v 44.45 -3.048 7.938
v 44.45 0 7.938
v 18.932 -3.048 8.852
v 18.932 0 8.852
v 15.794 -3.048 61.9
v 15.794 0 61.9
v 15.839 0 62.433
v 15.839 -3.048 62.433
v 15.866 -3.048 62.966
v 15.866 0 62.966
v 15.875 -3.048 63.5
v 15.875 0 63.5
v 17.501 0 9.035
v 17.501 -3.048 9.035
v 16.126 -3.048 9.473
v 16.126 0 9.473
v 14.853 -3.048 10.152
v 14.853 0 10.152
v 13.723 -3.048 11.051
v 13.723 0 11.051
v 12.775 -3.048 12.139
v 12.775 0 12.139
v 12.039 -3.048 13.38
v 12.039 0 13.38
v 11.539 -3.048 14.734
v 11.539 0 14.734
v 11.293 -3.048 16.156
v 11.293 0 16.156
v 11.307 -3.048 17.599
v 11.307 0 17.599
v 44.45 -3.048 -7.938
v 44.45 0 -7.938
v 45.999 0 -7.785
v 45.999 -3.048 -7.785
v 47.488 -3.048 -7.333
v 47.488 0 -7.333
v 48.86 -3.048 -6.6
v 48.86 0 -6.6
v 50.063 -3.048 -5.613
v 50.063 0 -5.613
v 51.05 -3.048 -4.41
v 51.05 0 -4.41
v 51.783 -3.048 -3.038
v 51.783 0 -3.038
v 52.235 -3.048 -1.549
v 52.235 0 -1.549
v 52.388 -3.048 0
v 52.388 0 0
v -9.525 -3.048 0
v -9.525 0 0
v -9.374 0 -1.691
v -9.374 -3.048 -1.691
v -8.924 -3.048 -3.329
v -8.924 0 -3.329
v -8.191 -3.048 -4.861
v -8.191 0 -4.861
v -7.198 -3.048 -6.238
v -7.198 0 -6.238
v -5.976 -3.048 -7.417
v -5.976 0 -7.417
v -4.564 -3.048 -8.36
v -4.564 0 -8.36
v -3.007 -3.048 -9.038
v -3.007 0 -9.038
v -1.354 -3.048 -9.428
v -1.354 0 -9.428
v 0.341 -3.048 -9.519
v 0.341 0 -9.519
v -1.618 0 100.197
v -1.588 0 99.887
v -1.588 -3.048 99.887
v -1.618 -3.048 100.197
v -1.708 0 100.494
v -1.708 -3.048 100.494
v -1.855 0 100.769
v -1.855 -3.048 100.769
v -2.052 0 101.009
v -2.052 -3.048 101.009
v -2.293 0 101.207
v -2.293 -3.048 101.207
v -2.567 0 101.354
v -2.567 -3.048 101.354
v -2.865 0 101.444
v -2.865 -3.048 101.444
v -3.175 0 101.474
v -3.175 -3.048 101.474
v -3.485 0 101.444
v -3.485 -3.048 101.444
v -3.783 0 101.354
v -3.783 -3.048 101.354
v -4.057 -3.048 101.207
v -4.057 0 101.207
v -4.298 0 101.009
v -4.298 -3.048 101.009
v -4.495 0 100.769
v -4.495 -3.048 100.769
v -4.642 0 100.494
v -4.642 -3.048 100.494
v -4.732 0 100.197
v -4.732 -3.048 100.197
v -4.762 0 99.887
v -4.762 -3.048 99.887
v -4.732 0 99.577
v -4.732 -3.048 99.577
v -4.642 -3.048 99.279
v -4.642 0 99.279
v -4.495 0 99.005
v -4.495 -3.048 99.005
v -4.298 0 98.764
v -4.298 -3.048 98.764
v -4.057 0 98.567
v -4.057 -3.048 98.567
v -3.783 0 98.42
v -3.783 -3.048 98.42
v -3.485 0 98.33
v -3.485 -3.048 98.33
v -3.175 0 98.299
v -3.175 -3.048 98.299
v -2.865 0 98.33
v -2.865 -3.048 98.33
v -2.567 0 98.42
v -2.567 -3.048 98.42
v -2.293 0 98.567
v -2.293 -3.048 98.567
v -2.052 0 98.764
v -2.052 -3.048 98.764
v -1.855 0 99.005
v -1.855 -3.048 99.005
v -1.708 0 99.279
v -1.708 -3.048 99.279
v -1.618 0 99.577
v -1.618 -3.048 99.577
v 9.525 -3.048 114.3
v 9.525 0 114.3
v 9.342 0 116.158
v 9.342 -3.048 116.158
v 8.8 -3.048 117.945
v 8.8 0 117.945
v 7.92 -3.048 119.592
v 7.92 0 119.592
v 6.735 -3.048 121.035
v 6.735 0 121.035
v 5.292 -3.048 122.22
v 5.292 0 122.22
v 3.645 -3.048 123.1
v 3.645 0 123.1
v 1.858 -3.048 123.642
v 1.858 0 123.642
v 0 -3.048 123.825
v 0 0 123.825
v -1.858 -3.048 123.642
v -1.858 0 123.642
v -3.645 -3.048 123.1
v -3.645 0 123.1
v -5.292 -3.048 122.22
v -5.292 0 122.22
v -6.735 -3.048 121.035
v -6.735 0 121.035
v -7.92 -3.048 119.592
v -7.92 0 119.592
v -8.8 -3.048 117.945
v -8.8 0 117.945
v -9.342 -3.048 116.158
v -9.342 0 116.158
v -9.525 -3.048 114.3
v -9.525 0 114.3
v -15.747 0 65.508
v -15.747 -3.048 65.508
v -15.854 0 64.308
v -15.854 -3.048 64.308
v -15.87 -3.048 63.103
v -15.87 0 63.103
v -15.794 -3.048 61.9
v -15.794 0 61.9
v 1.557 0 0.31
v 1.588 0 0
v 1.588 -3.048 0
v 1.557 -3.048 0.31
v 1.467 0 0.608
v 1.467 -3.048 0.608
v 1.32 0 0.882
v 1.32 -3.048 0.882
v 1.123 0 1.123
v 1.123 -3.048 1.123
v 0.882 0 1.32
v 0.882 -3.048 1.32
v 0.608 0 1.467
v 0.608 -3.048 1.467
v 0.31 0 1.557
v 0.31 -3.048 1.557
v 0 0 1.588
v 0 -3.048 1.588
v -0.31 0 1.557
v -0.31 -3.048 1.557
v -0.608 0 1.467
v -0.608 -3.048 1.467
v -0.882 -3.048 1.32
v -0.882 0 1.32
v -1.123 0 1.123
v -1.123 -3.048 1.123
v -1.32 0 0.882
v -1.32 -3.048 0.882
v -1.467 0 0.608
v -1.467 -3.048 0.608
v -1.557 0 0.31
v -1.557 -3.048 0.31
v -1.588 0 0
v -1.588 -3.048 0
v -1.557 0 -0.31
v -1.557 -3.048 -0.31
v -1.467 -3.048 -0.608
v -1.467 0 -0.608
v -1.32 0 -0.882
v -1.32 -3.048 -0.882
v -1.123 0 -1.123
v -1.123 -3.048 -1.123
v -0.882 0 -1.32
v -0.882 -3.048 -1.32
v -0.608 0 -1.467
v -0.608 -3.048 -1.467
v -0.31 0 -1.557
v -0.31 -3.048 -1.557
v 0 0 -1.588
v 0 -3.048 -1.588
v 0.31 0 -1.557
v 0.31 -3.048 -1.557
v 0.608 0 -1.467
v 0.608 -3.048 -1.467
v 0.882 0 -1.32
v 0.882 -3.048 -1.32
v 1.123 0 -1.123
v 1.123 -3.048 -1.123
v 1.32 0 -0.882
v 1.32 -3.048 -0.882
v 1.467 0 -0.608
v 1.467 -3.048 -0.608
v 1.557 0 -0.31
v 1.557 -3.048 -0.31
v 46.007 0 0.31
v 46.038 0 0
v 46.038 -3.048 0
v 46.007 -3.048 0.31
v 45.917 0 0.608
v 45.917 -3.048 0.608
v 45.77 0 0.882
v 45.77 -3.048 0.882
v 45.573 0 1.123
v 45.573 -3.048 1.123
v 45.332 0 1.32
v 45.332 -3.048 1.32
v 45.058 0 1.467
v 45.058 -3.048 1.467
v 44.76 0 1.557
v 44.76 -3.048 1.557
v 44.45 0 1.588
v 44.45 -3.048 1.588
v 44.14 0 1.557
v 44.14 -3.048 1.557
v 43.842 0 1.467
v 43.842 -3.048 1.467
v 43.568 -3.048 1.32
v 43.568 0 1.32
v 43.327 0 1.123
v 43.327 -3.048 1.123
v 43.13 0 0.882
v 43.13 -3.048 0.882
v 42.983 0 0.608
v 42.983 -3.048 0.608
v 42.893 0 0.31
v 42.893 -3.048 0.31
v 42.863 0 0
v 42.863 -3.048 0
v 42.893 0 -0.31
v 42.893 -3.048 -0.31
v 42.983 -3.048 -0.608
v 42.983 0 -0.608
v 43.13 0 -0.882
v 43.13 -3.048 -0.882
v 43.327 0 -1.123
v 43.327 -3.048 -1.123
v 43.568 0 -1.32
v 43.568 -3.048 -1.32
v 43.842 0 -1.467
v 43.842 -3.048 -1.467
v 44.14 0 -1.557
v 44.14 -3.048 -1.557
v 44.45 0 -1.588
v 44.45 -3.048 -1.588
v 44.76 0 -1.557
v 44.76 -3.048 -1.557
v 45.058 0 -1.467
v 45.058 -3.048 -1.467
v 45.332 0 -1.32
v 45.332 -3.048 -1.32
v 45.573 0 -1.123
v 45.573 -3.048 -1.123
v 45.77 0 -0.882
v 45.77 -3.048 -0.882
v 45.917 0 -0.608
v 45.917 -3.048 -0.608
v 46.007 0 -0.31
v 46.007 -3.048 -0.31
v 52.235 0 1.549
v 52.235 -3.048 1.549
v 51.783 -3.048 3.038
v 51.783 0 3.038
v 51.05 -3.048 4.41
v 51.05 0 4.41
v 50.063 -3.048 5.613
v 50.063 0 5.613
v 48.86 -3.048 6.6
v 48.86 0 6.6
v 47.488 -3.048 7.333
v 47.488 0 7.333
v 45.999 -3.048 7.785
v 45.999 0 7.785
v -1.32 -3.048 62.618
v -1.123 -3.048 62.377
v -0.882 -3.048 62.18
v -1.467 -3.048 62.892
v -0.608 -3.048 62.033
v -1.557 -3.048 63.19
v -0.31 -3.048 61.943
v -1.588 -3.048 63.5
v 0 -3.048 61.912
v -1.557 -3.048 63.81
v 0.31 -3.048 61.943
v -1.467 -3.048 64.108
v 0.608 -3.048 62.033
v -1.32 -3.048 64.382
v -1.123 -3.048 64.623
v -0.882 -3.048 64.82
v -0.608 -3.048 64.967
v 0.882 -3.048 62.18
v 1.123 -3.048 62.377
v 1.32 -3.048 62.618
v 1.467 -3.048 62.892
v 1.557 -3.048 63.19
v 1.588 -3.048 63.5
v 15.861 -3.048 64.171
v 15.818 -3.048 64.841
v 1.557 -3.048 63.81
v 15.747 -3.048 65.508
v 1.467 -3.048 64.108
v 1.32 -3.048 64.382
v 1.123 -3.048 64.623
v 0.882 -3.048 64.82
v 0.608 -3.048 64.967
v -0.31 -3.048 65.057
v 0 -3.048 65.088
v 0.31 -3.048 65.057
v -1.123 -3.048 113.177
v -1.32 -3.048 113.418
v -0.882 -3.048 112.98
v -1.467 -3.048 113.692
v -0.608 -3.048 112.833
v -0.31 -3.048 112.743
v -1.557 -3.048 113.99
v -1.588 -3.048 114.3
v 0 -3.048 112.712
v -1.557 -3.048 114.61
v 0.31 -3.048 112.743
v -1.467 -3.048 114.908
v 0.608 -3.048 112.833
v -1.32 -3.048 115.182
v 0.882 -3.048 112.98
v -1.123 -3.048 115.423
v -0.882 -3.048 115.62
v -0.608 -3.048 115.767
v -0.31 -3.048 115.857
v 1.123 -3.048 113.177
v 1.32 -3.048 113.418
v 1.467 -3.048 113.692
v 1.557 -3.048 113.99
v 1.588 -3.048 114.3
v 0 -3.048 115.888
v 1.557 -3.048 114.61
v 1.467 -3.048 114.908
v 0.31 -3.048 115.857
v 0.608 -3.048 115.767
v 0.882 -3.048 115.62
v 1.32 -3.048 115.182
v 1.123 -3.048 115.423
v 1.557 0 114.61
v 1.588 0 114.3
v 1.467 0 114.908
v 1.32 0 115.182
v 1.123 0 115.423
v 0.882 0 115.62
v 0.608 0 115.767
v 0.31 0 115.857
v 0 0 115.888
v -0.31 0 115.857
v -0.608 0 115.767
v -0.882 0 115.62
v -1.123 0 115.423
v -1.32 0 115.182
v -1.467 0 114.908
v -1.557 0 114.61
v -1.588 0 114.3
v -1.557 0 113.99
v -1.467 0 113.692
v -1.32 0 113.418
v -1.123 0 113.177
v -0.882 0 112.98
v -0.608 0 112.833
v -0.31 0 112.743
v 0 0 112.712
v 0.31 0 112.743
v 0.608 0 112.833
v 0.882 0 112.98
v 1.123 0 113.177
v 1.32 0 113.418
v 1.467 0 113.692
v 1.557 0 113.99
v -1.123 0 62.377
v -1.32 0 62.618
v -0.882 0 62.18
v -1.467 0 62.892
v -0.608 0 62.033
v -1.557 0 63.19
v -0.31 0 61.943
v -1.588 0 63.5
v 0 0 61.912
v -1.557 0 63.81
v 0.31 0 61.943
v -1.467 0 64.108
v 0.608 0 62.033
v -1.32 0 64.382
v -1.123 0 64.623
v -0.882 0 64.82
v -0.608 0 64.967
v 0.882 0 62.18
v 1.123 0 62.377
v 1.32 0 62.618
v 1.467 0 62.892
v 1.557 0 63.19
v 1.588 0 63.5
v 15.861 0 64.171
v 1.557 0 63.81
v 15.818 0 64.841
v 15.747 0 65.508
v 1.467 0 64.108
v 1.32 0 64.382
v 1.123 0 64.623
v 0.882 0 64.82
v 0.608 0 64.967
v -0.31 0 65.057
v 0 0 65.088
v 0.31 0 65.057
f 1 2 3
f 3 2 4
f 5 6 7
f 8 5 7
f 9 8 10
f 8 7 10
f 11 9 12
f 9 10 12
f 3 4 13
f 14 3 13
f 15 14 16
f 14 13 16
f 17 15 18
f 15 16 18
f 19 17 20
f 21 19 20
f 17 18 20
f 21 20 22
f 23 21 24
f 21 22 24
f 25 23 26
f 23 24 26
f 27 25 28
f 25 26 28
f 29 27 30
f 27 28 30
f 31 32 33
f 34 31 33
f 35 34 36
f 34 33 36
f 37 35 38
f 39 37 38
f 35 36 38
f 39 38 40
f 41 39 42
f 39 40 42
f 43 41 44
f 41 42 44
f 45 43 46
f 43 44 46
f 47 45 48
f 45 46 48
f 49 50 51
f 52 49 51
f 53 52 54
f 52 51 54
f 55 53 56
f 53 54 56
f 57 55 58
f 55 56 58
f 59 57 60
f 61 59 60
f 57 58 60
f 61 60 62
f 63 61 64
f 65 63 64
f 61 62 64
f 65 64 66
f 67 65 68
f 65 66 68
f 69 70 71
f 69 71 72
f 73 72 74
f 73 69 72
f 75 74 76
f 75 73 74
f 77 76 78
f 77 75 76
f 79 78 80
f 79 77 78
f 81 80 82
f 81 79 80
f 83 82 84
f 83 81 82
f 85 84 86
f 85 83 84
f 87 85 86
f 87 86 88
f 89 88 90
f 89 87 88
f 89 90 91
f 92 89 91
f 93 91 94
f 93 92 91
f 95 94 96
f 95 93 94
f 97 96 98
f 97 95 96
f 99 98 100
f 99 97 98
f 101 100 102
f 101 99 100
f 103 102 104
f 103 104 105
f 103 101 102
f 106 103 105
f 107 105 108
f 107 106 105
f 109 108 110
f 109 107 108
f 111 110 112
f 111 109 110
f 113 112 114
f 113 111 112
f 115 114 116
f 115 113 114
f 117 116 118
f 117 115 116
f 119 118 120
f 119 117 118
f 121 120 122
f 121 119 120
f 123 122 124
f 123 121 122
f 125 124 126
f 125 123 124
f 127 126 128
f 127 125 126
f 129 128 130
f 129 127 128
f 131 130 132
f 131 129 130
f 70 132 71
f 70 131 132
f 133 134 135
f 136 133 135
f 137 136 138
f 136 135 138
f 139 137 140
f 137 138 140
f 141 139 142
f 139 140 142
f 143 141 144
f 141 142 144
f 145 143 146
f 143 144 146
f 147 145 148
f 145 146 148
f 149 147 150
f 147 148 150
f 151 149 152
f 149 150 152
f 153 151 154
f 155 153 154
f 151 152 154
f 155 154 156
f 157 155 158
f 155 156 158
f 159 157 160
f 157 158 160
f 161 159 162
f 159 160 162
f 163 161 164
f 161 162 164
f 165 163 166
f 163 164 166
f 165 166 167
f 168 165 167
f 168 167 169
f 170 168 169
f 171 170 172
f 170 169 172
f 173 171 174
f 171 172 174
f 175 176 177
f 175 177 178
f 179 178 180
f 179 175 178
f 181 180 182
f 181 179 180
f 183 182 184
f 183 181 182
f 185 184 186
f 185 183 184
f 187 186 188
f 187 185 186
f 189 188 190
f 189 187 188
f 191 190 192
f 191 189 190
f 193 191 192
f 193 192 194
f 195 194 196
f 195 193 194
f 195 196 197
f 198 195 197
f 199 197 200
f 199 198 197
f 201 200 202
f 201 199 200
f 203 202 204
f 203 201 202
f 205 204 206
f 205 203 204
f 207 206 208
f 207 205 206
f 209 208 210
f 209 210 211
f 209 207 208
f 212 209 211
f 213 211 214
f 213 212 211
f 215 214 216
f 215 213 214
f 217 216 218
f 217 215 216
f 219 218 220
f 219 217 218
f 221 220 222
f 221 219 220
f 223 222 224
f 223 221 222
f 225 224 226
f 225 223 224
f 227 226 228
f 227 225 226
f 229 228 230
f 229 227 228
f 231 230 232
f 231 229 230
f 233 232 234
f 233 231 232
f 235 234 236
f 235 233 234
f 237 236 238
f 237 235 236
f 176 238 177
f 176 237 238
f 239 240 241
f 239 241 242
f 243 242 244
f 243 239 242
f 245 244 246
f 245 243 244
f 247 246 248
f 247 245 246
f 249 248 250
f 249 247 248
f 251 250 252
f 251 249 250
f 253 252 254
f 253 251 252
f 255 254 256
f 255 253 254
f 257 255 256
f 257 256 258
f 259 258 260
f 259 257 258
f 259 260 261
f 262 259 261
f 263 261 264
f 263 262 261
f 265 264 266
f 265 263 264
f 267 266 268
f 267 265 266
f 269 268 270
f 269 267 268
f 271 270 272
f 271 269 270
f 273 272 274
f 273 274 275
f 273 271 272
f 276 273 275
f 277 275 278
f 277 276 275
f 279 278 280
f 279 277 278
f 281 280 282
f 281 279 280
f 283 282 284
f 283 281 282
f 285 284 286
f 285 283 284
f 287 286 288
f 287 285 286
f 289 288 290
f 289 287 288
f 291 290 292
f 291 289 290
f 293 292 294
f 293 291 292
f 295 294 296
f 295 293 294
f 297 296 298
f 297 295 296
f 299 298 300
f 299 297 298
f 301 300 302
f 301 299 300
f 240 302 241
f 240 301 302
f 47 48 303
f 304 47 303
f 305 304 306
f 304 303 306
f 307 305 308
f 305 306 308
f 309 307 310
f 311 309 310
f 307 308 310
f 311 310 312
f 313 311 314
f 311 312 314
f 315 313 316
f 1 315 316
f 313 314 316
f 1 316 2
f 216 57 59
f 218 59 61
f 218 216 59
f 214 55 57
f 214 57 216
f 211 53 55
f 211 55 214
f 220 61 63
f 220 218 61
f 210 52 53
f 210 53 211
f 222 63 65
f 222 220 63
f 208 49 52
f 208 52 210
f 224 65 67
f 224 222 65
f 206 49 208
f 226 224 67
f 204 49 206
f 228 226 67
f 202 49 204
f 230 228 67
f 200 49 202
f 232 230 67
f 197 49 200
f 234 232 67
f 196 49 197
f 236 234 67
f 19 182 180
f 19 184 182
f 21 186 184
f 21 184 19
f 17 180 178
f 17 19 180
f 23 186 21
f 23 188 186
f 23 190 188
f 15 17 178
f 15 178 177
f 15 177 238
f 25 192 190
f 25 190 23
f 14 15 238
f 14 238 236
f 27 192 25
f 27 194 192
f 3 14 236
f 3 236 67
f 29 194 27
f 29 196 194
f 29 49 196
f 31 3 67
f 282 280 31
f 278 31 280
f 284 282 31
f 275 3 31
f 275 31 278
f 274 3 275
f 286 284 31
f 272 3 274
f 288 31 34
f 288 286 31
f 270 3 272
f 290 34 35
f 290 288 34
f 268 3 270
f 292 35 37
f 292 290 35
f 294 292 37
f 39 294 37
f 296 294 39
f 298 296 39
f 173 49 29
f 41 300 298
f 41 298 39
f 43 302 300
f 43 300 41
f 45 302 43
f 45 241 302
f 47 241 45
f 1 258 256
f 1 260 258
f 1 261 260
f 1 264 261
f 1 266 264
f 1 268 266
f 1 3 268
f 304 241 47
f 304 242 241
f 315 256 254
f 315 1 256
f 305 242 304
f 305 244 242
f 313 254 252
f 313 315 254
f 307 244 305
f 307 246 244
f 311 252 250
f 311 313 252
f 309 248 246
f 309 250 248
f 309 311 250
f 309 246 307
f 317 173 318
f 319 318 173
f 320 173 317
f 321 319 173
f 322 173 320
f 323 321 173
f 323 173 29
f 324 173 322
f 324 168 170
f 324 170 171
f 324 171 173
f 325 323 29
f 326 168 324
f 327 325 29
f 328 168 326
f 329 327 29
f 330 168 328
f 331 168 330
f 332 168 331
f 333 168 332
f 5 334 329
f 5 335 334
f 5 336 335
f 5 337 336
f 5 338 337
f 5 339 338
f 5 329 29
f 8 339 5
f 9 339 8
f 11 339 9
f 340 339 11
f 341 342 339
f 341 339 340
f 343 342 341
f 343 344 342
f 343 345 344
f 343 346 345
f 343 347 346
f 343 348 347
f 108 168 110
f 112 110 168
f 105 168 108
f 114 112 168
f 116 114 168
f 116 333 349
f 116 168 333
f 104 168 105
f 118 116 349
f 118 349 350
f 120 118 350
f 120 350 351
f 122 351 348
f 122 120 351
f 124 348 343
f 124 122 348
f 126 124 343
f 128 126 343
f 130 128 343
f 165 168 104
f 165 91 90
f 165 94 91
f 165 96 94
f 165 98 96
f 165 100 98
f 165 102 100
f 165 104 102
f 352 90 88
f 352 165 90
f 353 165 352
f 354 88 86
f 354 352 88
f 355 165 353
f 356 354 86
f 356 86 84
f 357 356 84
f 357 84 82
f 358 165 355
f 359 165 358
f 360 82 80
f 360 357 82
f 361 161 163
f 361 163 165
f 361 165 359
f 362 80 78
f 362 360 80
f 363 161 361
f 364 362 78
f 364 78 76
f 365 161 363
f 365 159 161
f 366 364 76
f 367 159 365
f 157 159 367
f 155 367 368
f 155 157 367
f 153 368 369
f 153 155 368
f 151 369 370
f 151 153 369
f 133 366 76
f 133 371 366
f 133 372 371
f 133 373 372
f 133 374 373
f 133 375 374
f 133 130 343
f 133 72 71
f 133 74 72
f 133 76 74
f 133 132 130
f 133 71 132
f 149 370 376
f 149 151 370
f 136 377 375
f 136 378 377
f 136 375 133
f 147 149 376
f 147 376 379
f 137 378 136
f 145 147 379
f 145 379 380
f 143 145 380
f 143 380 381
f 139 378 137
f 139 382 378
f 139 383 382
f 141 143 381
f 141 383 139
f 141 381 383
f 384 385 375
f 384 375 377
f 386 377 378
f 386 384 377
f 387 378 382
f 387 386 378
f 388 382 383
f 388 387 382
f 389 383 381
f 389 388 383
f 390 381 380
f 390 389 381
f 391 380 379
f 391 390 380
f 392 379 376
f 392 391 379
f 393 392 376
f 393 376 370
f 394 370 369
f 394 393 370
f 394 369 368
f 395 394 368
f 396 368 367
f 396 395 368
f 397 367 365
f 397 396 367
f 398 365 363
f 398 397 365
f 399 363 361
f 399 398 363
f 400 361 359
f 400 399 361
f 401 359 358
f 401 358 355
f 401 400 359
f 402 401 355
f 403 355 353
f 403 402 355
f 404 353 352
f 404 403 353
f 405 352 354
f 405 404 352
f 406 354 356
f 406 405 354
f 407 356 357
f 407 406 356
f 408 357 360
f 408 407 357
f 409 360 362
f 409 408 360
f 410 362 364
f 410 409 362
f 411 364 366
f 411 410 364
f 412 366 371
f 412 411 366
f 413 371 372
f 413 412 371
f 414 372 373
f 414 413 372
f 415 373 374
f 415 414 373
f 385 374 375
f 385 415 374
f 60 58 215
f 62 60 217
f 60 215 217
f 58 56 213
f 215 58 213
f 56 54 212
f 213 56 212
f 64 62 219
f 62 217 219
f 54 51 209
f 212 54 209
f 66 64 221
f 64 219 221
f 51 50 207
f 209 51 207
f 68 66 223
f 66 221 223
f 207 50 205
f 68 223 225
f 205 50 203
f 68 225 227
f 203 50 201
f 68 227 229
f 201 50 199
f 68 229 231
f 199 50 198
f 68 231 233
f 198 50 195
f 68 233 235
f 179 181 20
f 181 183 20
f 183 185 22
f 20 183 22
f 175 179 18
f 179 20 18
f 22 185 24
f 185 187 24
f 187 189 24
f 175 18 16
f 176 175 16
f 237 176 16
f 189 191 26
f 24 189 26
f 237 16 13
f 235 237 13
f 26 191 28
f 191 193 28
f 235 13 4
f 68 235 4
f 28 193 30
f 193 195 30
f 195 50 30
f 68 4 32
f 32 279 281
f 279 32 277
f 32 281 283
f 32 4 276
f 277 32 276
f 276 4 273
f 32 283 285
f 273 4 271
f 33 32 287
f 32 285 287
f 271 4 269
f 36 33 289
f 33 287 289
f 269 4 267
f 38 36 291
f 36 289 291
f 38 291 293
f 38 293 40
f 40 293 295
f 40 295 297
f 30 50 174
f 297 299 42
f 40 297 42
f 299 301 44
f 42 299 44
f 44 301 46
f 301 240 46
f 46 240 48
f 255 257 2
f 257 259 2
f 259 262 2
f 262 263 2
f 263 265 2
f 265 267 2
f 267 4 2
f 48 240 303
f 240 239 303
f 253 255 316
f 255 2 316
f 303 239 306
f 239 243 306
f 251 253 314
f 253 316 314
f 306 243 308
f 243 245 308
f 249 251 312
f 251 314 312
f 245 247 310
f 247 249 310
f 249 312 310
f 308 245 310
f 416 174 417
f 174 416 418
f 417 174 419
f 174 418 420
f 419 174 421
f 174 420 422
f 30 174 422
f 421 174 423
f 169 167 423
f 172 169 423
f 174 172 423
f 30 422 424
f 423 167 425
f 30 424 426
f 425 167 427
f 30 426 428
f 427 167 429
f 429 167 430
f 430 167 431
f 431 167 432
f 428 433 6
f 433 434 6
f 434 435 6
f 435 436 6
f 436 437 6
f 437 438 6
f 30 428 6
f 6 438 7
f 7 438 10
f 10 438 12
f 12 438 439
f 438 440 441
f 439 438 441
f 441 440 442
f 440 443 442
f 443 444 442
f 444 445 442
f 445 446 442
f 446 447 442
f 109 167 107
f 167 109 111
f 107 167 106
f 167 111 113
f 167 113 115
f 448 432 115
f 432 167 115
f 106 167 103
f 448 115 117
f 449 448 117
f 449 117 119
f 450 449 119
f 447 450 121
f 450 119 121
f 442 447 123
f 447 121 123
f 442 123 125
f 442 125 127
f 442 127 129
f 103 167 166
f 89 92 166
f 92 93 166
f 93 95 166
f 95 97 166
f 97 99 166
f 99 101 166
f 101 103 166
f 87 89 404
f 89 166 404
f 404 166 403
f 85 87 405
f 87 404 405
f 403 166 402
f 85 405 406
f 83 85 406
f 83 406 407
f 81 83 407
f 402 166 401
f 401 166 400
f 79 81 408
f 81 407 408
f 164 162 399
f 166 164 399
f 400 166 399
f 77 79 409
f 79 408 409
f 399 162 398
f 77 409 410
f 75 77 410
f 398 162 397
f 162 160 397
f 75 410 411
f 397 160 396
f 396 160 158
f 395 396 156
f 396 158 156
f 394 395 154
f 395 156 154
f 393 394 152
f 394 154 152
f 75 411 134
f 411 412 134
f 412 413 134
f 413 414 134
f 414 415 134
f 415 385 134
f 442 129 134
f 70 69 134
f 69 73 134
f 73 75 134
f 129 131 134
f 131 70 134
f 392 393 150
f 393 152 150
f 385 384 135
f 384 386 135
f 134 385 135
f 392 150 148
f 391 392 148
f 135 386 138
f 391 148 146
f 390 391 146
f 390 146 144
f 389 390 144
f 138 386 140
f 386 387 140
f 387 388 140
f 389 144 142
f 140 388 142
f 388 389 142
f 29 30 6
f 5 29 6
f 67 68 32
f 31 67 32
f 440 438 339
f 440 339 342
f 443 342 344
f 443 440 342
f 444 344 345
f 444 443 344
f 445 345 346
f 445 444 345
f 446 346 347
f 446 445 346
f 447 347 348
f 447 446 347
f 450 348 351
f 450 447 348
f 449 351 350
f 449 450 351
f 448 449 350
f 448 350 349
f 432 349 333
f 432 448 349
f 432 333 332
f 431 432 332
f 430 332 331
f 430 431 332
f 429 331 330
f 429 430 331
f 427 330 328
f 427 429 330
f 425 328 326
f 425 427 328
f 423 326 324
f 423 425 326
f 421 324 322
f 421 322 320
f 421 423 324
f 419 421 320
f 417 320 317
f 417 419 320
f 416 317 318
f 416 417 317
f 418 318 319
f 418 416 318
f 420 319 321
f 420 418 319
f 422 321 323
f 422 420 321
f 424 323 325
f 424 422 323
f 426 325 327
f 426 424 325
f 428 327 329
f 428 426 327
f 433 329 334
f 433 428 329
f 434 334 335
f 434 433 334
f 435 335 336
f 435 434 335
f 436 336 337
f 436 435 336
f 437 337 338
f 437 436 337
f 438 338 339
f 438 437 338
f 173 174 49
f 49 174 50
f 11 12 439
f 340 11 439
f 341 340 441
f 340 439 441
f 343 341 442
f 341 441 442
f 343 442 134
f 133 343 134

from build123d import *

# Parameters (mm, degrees)
F0_R     = 1.5875
F1_DEPTH = 3.048


with BuildPart() as f1:
    # F0 (on Front) → F1 (new body)
    with BuildSketch(Plane.XZ):
        with BuildLine():
            ThreePointArc((15.794203, 61.90038), (0, 47.625), (-15.794203, 61.90038))
            Line((-15.794203, 61.90038), (-9.525, 0))
            ThreePointArc((-9.525, 0), (0, 9.525), (9.525, 0))
            ThreePointArc((9.525, 0), (6.854788, -6.613434), (0.341271, -9.518884))
            Line((0.341271, -9.518884), (44.45, -7.9375))
            ThreePointArc((44.45, -7.9375), (36.5125, 0), (44.45, 7.9375))
            Line((44.45, 7.9375), (18.932251, 8.852361))
            ThreePointArc((18.932251, 8.852361), (13.224458, 11.573096), (11.307362, 17.598546))
            Line((11.307362, 17.598546), (15.794203, 61.90038))
        make_face()
        with BuildLine():
            Line((15.747457, 65.508289), (9.525, 114.3))
            ThreePointArc((9.525, 114.3), (0, 104.775), (-9.525, 114.3))
            Line((-9.525, 114.3), (-15.747457, 65.508289))
            ThreePointArc((-15.747457, 65.508289), (0, 79.375), (15.747457, 65.508289))
        make_face()
        with Locations((-3.175, 99.886943)):
            Circle(F0_R, mode=Mode.SUBTRACT)
        with BuildLine():
            ThreePointArc((15.875, 63.5), (15.843082, 64.506168), (15.747457, 65.508289))
            ThreePointArc((15.747457, 65.508289), (0, 79.375), (-15.747457, 65.508289))
            ThreePointArc((-15.747457, 65.508289), (-15.873668, 63.705667), (-15.794203, 61.90038))
            ThreePointArc((-15.794203, 61.90038), (0, 47.625), (15.794203, 61.90038))
            ThreePointArc((15.794203, 61.90038), (15.854788, 62.699171), (15.875, 63.5))
        make_face()
        with Locations((0, 63.5)):
            Circle(F0_R, mode=Mode.SUBTRACT)
        with BuildLine():
            ThreePointArc((-9.525, 114.3), (0, 104.775), (9.525, 114.3))
            ThreePointArc((9.525, 114.3), (0, 123.825), (-9.525, 114.3))
        make_face()
        with Locations((0, 114.3)):
            Circle(F0_R, mode=Mode.SUBTRACT)
        with BuildLine():
            ThreePointArc((9.525, 0), (0, 9.525), (-9.525, 0))
            ThreePointArc((-9.525, 0), (-6.613434, -6.854788), (0.341271, -9.518884))
            ThreePointArc((0.341271, -9.518884), (6.854788, -6.613434), (9.525, 0))
        make_face()
        Circle(F0_R, mode=Mode.SUBTRACT)
        with BuildLine():
            ThreePointArc((44.45, 7.9375), (36.5125, 0), (44.45, -7.9375))
            ThreePointArc((44.45, -7.9375), (50.06266, -5.61266), (52.3875, 0))
            ThreePointArc((52.3875, 0), (50.06266, 5.61266), (44.45, 7.9375))
        make_face()
        with Locations((44.45, 0)):
            Circle(F0_R, mode=Mode.SUBTRACT)
    extrude(amount=F1_DEPTH)


solid = f1.part
